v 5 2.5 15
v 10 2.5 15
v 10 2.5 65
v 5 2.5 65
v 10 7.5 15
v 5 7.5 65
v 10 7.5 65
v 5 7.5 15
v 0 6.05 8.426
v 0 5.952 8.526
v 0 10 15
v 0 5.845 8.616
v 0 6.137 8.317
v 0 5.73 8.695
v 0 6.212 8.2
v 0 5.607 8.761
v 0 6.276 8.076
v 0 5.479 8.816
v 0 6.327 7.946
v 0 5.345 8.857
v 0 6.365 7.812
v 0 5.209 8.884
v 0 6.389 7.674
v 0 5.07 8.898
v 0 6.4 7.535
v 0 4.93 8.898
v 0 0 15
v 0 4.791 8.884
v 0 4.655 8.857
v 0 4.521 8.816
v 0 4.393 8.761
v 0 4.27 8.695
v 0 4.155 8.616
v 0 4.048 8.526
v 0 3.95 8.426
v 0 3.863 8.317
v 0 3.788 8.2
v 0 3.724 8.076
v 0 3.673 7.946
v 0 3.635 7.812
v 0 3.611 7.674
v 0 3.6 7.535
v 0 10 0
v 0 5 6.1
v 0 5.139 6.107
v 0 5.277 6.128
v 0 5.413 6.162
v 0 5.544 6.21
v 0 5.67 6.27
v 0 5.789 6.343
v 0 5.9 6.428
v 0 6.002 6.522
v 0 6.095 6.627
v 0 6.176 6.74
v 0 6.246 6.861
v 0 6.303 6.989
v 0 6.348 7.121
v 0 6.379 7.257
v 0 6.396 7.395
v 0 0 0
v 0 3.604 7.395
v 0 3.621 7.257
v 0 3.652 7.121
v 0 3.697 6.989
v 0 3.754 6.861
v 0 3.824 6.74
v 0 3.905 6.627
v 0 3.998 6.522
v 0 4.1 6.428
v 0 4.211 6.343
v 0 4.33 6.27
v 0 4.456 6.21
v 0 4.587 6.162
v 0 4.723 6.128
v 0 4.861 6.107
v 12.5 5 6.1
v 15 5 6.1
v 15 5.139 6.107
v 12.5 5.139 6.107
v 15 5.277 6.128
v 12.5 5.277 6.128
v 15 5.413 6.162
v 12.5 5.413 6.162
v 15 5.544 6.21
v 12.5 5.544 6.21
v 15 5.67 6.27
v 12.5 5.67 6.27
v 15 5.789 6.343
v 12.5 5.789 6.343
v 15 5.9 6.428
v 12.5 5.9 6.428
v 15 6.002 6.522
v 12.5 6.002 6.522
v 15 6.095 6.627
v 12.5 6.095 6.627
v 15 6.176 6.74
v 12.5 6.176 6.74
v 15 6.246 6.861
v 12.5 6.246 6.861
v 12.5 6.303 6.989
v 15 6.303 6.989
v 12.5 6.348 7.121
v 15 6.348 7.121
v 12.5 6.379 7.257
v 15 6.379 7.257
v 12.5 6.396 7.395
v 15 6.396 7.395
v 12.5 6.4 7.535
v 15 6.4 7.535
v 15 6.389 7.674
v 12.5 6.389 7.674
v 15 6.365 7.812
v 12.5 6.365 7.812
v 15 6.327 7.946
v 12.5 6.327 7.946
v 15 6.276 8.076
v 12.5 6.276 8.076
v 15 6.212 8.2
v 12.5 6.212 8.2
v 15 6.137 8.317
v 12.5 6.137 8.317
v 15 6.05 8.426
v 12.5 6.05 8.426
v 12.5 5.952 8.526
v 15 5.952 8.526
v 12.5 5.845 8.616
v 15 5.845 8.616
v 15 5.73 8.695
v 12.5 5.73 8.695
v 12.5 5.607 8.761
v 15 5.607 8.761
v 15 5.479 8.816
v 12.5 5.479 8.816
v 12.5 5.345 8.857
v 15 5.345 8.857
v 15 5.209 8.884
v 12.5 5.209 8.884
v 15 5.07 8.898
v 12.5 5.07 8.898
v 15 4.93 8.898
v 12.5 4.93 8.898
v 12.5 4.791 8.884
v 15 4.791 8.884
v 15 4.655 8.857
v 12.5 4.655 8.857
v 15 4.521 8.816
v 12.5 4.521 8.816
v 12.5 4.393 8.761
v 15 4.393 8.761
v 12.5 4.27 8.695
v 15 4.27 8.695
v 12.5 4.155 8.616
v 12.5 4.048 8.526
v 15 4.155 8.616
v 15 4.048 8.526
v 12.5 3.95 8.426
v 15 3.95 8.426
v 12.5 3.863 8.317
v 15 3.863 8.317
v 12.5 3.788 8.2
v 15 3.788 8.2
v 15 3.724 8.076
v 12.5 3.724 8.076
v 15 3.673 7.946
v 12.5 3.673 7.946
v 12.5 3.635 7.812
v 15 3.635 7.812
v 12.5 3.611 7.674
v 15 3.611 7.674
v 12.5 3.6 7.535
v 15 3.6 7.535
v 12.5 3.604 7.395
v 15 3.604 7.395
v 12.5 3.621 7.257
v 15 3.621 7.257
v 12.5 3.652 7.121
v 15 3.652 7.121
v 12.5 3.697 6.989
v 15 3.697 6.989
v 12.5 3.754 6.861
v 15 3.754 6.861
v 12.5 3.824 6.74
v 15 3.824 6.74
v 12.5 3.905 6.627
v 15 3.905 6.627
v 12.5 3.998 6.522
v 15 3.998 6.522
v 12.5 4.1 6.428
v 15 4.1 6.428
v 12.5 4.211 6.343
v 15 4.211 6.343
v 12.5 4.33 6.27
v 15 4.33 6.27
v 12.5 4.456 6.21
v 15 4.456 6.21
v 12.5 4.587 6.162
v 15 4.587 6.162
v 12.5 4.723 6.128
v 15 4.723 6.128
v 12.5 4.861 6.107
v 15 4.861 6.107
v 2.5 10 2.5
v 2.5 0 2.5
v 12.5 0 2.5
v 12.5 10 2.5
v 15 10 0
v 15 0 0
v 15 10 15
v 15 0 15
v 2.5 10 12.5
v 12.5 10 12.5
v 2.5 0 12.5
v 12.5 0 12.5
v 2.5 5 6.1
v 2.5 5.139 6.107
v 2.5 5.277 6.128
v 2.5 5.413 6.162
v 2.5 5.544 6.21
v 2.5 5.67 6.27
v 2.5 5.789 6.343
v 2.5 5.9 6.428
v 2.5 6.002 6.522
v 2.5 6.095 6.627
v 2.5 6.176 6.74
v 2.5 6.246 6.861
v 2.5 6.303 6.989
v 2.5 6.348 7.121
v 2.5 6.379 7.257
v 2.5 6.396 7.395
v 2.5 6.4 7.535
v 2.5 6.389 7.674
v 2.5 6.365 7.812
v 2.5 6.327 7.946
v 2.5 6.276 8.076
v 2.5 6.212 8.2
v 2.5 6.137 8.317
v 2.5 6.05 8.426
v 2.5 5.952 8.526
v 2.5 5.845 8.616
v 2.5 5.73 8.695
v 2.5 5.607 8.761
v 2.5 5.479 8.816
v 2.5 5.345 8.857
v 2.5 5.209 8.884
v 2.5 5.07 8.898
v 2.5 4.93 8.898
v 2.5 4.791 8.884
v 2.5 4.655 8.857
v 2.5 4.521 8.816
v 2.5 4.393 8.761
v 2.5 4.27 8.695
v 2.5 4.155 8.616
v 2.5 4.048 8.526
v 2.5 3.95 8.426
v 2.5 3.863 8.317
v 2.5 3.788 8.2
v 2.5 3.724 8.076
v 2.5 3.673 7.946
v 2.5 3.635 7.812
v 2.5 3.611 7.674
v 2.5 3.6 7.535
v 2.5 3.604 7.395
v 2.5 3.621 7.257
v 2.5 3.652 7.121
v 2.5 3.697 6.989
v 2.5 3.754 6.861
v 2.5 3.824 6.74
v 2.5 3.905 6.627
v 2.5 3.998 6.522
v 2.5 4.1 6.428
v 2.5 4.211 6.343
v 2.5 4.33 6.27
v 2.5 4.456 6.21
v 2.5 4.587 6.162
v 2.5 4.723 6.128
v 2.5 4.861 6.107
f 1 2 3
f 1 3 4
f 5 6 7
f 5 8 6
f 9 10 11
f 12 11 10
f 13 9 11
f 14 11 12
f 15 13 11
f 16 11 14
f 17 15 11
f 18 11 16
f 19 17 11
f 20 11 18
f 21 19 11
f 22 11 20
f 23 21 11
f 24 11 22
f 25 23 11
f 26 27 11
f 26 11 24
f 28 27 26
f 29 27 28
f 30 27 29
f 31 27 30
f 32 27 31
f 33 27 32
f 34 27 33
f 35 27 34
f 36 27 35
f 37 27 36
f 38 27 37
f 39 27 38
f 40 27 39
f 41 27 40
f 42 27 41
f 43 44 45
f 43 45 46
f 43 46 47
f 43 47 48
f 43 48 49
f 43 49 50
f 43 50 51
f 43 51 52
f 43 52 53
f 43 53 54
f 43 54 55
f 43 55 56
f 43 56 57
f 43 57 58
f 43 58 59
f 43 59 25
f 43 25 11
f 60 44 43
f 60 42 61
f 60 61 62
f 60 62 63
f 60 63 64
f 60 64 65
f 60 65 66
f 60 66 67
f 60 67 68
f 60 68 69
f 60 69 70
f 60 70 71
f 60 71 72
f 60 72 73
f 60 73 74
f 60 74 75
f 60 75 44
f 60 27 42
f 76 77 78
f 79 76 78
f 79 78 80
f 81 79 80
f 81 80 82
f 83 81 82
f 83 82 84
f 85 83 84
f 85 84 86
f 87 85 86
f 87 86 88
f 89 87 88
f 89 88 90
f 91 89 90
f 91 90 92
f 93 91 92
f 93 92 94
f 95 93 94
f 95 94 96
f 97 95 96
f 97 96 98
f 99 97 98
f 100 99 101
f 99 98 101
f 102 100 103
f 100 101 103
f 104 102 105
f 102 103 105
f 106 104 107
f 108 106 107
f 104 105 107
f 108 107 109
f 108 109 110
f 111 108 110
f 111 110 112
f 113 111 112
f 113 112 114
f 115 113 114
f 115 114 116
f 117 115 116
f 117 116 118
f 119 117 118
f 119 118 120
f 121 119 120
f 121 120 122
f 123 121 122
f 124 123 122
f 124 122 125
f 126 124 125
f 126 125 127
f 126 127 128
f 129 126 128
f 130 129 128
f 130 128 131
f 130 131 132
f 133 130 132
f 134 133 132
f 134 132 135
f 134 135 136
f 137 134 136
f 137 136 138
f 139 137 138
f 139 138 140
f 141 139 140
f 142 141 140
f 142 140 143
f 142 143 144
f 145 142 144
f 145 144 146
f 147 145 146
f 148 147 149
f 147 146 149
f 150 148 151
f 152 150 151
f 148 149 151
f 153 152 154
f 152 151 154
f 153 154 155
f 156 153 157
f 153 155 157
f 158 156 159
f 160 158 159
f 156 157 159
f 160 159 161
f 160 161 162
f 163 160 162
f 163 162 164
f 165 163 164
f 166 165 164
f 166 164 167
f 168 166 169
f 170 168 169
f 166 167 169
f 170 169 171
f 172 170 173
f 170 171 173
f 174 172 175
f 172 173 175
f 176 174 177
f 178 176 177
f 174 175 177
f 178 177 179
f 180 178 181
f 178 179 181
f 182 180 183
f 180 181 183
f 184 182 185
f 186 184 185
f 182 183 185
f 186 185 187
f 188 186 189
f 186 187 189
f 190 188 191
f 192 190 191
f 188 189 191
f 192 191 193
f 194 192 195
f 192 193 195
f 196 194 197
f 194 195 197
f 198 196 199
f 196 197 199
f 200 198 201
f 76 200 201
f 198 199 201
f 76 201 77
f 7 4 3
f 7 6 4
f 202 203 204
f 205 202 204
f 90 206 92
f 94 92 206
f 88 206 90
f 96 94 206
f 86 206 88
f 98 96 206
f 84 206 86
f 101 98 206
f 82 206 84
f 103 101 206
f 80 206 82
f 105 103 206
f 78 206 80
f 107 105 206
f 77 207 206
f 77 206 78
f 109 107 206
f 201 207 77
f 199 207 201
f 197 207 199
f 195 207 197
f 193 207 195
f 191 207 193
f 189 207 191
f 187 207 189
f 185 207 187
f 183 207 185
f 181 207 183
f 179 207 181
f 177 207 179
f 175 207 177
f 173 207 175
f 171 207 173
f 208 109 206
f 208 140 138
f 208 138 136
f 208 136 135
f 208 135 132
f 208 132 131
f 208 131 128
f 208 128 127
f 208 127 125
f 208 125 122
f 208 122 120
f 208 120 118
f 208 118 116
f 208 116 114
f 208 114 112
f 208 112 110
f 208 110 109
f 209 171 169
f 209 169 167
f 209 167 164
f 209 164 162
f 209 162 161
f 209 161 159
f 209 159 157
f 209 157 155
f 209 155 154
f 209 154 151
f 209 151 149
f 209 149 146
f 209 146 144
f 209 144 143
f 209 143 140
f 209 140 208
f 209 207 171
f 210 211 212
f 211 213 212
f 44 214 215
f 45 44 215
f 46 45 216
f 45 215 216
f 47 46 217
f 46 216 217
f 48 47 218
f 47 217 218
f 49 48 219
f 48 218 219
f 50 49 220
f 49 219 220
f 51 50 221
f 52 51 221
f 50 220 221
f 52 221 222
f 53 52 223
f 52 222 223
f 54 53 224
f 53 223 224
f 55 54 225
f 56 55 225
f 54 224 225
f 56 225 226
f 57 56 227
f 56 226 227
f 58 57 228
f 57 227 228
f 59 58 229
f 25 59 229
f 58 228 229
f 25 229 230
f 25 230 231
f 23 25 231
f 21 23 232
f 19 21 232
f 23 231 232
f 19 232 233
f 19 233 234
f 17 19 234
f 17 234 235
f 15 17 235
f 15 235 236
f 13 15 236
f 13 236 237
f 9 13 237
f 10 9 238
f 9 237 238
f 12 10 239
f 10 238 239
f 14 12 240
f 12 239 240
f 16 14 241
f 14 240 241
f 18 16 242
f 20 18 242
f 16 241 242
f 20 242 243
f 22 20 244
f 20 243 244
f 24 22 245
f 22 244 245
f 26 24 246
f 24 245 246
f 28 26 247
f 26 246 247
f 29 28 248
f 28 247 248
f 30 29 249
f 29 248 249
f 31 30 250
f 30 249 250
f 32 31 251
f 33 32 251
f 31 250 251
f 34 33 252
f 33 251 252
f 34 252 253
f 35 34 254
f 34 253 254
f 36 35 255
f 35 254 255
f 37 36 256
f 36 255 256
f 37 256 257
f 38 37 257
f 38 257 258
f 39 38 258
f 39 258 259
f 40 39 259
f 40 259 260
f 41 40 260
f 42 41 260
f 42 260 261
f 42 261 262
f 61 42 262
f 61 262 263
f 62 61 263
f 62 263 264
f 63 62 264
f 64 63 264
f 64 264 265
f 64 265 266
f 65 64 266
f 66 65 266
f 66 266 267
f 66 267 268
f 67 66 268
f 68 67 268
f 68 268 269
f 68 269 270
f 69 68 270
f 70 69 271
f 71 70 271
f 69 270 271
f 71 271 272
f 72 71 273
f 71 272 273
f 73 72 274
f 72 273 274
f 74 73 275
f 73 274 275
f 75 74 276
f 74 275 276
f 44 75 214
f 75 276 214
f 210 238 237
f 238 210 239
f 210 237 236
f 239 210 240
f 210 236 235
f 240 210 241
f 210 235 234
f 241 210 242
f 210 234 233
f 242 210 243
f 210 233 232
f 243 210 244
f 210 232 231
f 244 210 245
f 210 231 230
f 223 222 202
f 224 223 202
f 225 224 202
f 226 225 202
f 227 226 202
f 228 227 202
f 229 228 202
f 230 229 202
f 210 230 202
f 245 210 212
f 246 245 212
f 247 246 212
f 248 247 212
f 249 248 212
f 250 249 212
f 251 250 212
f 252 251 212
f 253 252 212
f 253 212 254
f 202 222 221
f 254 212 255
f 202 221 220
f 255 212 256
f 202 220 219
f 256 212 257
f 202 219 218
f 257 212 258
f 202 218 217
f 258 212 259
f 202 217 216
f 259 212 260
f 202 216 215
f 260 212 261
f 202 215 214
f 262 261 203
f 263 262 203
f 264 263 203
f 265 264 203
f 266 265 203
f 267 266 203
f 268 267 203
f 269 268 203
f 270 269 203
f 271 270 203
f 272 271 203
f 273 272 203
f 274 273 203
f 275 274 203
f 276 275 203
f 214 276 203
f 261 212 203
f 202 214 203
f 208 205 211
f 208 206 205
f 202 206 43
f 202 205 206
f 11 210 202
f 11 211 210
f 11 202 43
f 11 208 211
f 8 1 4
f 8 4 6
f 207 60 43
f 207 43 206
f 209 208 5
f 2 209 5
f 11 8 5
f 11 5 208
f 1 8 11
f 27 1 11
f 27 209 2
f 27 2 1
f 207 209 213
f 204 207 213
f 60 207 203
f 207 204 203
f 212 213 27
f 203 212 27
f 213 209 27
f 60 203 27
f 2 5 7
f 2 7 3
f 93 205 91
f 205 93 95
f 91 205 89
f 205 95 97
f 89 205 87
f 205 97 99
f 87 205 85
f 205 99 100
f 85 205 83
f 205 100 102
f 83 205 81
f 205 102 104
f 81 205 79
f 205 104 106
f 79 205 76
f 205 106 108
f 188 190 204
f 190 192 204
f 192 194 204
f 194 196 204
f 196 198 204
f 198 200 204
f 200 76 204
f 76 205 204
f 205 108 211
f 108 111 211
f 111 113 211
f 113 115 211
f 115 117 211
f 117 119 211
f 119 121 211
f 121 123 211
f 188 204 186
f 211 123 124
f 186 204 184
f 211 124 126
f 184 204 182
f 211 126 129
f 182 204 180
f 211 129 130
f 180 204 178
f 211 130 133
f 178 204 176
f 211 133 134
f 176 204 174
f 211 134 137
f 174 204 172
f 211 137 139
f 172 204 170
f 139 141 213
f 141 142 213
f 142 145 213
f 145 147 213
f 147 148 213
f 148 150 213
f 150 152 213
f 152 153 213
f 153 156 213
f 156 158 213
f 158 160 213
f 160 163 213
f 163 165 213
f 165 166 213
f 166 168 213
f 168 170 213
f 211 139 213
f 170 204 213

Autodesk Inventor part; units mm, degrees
ref_plane "YZ Plane" through (0, 0, 0) normal (1, 0, 0) x (0, 1, 0)
ref_plane "XZ Plane" through (0, 0, 0) normal (0, 1, 0) x (-1, 0, 0)
ref_plane "XY Plane" through (0, 0, 0) normal (0, 0, 1) x (1, 0, 0)
sketch "Sketch1" plane through (0, 0, 0) normal (0, 1, 0) x (-1, 0, 0)
  line L0 (0, 0) -> (-15, 0)
  line L1 (-15, 0) -> (-15, 15)
  line L2 (-15, 15) -> (0, 15)
  line L3 (0, 15) -> (0, 0)
  line L4 (0, 0) -> (-2.5, 0)
  line L5 (-2.5, 0) -> (-2.5, 2.5)
  line L6 (-2.5, 2.5) -> (0, 2.5)
  line L7 (0, 2.5) -> (0, 0)
  line L8 (-2.5, 2.5) -> (-12.5, 2.5)
  line L9 (-12.5, 2.5) -> (-12.5, 12.5)
  line L10 (-12.5, 12.5) -> (-2.5, 12.5)
  line L11 (-2.5, 12.5) -> (-2.5, 2.5)
  dimension "d0" = 15
  dimension "d1" = 15
  dimension "d2" = 2.5
  dimension "d3" = 2.5
  dimension "d4" = 10
  dimension "d5" = 10
extrude "Extrusion1" add sketch "Sketch1" along normal blind 10
sketch "Sketch2" plane through (15, 0, 15) normal (1, 0, 0) x (0, 0, -1)
  line L0 (15, 0) -> (15, 10) projected
  line L1 (0, 10) -> (15, 10)
  line L2 (15, 10) -> (15, 0)
  line L3 (15, 0) -> (0, 0)
  line L4 (0, 0) -> (0, 10)
  line L5 (0, 0) -> (0, 10) projected
  line L6 (0, 10) -> (7.5, 10)
  line L7 (7.5, 10) -> (7.5, 5)
  line L8 (7.5, 5) -> (0, 5)
  line L9 (0, 5) -> (0, 10)
  circle A0 centre (7.5, 5) radius 1.4
  dimension "d8" = 7.5
  dimension "d9" = 5
  dimension "d10" = 2.8
extrude "Extrusion2" cut sketch "Sketch2" against normal through all contours A0 L8 L7 | L7 L8 A0
sketch "Sketch3" plane through (0, 0, 15) normal (0, 0, 1) x (1, 0, 0)
  line L0 (15, 10) -> (0, 10) projected
  line L1 (15, 0) -> (0, 0) projected
  line L2 (0, 10) -> (15, 10)
  line L3 (15, 10) -> (15, 0)
  line L4 (15, 0) -> (0, 0)
  line L5 (0, 0) -> (0, 10)
  line L6 (0, 10) -> (5, 10)
  line L7 (5, 10) -> (5, 7.5)
  line L8 (5, 7.5) -> (0, 7.5)
  line L9 (0, 7.5) -> (0, 10)
  line L10 (5, 7.5) -> (10, 7.5)
  line L11 (10, 7.5) -> (10, 2.5)
  line L12 (10, 2.5) -> (5, 2.5)
  line L13 (5, 2.5) -> (5, 7.5)
  dimension "d13" = 5
  dimension "d14" = 2.5
  dimension "d15" = 5
  dimension "d16" = 5
extrude "Extrusion3" add sketch "Sketch3" along normal blind 50 contours L10 L11 L12 L13
properties part number "CAM02"
